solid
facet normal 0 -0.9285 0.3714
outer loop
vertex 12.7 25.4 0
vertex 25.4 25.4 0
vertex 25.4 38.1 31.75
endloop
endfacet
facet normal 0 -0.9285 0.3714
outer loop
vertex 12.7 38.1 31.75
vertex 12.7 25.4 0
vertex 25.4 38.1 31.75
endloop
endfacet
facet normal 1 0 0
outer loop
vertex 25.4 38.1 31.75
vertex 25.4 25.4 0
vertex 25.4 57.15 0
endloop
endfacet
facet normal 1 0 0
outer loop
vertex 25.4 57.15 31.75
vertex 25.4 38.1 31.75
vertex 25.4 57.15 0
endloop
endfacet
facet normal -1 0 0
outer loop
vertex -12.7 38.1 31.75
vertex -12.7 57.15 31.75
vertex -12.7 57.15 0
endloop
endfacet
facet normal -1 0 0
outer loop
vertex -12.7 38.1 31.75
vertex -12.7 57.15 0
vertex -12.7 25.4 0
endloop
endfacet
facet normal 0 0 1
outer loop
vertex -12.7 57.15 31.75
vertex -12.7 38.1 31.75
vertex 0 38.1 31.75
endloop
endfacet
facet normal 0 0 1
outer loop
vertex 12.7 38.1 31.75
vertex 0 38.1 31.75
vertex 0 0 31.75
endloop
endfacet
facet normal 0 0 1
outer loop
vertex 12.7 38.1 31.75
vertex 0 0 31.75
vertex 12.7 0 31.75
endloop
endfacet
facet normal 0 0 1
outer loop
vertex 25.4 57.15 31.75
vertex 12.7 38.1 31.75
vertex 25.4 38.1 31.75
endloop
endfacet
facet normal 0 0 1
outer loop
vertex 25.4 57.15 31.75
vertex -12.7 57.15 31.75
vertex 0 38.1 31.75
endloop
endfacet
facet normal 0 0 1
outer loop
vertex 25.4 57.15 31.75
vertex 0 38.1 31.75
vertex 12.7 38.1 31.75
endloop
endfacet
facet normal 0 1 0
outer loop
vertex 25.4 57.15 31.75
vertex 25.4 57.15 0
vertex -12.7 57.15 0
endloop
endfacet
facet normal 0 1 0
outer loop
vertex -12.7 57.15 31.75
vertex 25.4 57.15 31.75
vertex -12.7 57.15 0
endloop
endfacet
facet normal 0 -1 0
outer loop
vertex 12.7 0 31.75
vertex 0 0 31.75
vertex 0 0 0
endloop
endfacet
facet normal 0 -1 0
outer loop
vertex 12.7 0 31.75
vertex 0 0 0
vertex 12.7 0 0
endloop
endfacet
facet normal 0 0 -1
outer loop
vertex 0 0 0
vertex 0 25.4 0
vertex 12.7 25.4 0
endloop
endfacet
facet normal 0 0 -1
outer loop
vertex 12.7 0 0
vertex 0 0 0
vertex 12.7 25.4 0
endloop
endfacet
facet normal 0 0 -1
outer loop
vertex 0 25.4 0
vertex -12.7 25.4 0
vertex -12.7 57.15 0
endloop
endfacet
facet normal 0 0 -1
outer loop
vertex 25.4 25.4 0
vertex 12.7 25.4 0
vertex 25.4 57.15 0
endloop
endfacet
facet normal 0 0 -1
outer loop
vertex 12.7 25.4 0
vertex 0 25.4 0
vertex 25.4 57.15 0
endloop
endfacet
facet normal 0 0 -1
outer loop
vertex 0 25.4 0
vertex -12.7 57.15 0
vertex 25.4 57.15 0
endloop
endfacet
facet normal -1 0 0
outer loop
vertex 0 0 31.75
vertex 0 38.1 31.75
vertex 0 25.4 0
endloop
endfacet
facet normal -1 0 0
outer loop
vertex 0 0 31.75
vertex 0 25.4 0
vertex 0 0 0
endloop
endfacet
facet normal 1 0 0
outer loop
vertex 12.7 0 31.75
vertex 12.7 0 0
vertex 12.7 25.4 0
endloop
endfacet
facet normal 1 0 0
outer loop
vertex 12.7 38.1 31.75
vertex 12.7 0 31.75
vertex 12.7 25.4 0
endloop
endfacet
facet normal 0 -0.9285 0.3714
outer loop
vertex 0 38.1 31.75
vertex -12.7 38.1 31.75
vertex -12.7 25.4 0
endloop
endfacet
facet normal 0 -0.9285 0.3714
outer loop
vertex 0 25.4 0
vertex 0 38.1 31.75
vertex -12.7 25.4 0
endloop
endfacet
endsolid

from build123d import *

# Parameters (mm, degrees)
F1_DEPTH = 31.75
F3_DEPTH = 12.7
F5_DEPTH = 12.7


with BuildPart() as f1:
    # F0 (on Top) → F1 (new body)
    with BuildSketch(Plane.XY):
        Polygon((0, 25.4), (0, 0), (12.7, 0), (12.7, 25.4), (25.4, 25.4), (25.4, 57.15), (-12.7, 57.15), (-12.7, 25.4), align=None)
    extrude(amount=F1_DEPTH)

    # F2 (on face) → F3 (cut)
    with BuildSketch(Plane(origin=(-12.7, 0, 0), x_dir=(0, -1, 0), z_dir=(-1, 0, 0))):
        Polygon((-38.1, 31.75), (-25.4, 0), (-25.4, 31.75), align=None)
    extrude(amount=-F3_DEPTH, mode=Mode.SUBTRACT)

    # F4 (on face) → F5 (cut)
    with BuildSketch(Plane.YZ.offset(25.4)):
        Polygon((25.4, 0), (38.1, 31.75), (25.4, 31.75), align=None)
    extrude(amount=-F5_DEPTH, mode=Mode.SUBTRACT)


solid = f1.part
